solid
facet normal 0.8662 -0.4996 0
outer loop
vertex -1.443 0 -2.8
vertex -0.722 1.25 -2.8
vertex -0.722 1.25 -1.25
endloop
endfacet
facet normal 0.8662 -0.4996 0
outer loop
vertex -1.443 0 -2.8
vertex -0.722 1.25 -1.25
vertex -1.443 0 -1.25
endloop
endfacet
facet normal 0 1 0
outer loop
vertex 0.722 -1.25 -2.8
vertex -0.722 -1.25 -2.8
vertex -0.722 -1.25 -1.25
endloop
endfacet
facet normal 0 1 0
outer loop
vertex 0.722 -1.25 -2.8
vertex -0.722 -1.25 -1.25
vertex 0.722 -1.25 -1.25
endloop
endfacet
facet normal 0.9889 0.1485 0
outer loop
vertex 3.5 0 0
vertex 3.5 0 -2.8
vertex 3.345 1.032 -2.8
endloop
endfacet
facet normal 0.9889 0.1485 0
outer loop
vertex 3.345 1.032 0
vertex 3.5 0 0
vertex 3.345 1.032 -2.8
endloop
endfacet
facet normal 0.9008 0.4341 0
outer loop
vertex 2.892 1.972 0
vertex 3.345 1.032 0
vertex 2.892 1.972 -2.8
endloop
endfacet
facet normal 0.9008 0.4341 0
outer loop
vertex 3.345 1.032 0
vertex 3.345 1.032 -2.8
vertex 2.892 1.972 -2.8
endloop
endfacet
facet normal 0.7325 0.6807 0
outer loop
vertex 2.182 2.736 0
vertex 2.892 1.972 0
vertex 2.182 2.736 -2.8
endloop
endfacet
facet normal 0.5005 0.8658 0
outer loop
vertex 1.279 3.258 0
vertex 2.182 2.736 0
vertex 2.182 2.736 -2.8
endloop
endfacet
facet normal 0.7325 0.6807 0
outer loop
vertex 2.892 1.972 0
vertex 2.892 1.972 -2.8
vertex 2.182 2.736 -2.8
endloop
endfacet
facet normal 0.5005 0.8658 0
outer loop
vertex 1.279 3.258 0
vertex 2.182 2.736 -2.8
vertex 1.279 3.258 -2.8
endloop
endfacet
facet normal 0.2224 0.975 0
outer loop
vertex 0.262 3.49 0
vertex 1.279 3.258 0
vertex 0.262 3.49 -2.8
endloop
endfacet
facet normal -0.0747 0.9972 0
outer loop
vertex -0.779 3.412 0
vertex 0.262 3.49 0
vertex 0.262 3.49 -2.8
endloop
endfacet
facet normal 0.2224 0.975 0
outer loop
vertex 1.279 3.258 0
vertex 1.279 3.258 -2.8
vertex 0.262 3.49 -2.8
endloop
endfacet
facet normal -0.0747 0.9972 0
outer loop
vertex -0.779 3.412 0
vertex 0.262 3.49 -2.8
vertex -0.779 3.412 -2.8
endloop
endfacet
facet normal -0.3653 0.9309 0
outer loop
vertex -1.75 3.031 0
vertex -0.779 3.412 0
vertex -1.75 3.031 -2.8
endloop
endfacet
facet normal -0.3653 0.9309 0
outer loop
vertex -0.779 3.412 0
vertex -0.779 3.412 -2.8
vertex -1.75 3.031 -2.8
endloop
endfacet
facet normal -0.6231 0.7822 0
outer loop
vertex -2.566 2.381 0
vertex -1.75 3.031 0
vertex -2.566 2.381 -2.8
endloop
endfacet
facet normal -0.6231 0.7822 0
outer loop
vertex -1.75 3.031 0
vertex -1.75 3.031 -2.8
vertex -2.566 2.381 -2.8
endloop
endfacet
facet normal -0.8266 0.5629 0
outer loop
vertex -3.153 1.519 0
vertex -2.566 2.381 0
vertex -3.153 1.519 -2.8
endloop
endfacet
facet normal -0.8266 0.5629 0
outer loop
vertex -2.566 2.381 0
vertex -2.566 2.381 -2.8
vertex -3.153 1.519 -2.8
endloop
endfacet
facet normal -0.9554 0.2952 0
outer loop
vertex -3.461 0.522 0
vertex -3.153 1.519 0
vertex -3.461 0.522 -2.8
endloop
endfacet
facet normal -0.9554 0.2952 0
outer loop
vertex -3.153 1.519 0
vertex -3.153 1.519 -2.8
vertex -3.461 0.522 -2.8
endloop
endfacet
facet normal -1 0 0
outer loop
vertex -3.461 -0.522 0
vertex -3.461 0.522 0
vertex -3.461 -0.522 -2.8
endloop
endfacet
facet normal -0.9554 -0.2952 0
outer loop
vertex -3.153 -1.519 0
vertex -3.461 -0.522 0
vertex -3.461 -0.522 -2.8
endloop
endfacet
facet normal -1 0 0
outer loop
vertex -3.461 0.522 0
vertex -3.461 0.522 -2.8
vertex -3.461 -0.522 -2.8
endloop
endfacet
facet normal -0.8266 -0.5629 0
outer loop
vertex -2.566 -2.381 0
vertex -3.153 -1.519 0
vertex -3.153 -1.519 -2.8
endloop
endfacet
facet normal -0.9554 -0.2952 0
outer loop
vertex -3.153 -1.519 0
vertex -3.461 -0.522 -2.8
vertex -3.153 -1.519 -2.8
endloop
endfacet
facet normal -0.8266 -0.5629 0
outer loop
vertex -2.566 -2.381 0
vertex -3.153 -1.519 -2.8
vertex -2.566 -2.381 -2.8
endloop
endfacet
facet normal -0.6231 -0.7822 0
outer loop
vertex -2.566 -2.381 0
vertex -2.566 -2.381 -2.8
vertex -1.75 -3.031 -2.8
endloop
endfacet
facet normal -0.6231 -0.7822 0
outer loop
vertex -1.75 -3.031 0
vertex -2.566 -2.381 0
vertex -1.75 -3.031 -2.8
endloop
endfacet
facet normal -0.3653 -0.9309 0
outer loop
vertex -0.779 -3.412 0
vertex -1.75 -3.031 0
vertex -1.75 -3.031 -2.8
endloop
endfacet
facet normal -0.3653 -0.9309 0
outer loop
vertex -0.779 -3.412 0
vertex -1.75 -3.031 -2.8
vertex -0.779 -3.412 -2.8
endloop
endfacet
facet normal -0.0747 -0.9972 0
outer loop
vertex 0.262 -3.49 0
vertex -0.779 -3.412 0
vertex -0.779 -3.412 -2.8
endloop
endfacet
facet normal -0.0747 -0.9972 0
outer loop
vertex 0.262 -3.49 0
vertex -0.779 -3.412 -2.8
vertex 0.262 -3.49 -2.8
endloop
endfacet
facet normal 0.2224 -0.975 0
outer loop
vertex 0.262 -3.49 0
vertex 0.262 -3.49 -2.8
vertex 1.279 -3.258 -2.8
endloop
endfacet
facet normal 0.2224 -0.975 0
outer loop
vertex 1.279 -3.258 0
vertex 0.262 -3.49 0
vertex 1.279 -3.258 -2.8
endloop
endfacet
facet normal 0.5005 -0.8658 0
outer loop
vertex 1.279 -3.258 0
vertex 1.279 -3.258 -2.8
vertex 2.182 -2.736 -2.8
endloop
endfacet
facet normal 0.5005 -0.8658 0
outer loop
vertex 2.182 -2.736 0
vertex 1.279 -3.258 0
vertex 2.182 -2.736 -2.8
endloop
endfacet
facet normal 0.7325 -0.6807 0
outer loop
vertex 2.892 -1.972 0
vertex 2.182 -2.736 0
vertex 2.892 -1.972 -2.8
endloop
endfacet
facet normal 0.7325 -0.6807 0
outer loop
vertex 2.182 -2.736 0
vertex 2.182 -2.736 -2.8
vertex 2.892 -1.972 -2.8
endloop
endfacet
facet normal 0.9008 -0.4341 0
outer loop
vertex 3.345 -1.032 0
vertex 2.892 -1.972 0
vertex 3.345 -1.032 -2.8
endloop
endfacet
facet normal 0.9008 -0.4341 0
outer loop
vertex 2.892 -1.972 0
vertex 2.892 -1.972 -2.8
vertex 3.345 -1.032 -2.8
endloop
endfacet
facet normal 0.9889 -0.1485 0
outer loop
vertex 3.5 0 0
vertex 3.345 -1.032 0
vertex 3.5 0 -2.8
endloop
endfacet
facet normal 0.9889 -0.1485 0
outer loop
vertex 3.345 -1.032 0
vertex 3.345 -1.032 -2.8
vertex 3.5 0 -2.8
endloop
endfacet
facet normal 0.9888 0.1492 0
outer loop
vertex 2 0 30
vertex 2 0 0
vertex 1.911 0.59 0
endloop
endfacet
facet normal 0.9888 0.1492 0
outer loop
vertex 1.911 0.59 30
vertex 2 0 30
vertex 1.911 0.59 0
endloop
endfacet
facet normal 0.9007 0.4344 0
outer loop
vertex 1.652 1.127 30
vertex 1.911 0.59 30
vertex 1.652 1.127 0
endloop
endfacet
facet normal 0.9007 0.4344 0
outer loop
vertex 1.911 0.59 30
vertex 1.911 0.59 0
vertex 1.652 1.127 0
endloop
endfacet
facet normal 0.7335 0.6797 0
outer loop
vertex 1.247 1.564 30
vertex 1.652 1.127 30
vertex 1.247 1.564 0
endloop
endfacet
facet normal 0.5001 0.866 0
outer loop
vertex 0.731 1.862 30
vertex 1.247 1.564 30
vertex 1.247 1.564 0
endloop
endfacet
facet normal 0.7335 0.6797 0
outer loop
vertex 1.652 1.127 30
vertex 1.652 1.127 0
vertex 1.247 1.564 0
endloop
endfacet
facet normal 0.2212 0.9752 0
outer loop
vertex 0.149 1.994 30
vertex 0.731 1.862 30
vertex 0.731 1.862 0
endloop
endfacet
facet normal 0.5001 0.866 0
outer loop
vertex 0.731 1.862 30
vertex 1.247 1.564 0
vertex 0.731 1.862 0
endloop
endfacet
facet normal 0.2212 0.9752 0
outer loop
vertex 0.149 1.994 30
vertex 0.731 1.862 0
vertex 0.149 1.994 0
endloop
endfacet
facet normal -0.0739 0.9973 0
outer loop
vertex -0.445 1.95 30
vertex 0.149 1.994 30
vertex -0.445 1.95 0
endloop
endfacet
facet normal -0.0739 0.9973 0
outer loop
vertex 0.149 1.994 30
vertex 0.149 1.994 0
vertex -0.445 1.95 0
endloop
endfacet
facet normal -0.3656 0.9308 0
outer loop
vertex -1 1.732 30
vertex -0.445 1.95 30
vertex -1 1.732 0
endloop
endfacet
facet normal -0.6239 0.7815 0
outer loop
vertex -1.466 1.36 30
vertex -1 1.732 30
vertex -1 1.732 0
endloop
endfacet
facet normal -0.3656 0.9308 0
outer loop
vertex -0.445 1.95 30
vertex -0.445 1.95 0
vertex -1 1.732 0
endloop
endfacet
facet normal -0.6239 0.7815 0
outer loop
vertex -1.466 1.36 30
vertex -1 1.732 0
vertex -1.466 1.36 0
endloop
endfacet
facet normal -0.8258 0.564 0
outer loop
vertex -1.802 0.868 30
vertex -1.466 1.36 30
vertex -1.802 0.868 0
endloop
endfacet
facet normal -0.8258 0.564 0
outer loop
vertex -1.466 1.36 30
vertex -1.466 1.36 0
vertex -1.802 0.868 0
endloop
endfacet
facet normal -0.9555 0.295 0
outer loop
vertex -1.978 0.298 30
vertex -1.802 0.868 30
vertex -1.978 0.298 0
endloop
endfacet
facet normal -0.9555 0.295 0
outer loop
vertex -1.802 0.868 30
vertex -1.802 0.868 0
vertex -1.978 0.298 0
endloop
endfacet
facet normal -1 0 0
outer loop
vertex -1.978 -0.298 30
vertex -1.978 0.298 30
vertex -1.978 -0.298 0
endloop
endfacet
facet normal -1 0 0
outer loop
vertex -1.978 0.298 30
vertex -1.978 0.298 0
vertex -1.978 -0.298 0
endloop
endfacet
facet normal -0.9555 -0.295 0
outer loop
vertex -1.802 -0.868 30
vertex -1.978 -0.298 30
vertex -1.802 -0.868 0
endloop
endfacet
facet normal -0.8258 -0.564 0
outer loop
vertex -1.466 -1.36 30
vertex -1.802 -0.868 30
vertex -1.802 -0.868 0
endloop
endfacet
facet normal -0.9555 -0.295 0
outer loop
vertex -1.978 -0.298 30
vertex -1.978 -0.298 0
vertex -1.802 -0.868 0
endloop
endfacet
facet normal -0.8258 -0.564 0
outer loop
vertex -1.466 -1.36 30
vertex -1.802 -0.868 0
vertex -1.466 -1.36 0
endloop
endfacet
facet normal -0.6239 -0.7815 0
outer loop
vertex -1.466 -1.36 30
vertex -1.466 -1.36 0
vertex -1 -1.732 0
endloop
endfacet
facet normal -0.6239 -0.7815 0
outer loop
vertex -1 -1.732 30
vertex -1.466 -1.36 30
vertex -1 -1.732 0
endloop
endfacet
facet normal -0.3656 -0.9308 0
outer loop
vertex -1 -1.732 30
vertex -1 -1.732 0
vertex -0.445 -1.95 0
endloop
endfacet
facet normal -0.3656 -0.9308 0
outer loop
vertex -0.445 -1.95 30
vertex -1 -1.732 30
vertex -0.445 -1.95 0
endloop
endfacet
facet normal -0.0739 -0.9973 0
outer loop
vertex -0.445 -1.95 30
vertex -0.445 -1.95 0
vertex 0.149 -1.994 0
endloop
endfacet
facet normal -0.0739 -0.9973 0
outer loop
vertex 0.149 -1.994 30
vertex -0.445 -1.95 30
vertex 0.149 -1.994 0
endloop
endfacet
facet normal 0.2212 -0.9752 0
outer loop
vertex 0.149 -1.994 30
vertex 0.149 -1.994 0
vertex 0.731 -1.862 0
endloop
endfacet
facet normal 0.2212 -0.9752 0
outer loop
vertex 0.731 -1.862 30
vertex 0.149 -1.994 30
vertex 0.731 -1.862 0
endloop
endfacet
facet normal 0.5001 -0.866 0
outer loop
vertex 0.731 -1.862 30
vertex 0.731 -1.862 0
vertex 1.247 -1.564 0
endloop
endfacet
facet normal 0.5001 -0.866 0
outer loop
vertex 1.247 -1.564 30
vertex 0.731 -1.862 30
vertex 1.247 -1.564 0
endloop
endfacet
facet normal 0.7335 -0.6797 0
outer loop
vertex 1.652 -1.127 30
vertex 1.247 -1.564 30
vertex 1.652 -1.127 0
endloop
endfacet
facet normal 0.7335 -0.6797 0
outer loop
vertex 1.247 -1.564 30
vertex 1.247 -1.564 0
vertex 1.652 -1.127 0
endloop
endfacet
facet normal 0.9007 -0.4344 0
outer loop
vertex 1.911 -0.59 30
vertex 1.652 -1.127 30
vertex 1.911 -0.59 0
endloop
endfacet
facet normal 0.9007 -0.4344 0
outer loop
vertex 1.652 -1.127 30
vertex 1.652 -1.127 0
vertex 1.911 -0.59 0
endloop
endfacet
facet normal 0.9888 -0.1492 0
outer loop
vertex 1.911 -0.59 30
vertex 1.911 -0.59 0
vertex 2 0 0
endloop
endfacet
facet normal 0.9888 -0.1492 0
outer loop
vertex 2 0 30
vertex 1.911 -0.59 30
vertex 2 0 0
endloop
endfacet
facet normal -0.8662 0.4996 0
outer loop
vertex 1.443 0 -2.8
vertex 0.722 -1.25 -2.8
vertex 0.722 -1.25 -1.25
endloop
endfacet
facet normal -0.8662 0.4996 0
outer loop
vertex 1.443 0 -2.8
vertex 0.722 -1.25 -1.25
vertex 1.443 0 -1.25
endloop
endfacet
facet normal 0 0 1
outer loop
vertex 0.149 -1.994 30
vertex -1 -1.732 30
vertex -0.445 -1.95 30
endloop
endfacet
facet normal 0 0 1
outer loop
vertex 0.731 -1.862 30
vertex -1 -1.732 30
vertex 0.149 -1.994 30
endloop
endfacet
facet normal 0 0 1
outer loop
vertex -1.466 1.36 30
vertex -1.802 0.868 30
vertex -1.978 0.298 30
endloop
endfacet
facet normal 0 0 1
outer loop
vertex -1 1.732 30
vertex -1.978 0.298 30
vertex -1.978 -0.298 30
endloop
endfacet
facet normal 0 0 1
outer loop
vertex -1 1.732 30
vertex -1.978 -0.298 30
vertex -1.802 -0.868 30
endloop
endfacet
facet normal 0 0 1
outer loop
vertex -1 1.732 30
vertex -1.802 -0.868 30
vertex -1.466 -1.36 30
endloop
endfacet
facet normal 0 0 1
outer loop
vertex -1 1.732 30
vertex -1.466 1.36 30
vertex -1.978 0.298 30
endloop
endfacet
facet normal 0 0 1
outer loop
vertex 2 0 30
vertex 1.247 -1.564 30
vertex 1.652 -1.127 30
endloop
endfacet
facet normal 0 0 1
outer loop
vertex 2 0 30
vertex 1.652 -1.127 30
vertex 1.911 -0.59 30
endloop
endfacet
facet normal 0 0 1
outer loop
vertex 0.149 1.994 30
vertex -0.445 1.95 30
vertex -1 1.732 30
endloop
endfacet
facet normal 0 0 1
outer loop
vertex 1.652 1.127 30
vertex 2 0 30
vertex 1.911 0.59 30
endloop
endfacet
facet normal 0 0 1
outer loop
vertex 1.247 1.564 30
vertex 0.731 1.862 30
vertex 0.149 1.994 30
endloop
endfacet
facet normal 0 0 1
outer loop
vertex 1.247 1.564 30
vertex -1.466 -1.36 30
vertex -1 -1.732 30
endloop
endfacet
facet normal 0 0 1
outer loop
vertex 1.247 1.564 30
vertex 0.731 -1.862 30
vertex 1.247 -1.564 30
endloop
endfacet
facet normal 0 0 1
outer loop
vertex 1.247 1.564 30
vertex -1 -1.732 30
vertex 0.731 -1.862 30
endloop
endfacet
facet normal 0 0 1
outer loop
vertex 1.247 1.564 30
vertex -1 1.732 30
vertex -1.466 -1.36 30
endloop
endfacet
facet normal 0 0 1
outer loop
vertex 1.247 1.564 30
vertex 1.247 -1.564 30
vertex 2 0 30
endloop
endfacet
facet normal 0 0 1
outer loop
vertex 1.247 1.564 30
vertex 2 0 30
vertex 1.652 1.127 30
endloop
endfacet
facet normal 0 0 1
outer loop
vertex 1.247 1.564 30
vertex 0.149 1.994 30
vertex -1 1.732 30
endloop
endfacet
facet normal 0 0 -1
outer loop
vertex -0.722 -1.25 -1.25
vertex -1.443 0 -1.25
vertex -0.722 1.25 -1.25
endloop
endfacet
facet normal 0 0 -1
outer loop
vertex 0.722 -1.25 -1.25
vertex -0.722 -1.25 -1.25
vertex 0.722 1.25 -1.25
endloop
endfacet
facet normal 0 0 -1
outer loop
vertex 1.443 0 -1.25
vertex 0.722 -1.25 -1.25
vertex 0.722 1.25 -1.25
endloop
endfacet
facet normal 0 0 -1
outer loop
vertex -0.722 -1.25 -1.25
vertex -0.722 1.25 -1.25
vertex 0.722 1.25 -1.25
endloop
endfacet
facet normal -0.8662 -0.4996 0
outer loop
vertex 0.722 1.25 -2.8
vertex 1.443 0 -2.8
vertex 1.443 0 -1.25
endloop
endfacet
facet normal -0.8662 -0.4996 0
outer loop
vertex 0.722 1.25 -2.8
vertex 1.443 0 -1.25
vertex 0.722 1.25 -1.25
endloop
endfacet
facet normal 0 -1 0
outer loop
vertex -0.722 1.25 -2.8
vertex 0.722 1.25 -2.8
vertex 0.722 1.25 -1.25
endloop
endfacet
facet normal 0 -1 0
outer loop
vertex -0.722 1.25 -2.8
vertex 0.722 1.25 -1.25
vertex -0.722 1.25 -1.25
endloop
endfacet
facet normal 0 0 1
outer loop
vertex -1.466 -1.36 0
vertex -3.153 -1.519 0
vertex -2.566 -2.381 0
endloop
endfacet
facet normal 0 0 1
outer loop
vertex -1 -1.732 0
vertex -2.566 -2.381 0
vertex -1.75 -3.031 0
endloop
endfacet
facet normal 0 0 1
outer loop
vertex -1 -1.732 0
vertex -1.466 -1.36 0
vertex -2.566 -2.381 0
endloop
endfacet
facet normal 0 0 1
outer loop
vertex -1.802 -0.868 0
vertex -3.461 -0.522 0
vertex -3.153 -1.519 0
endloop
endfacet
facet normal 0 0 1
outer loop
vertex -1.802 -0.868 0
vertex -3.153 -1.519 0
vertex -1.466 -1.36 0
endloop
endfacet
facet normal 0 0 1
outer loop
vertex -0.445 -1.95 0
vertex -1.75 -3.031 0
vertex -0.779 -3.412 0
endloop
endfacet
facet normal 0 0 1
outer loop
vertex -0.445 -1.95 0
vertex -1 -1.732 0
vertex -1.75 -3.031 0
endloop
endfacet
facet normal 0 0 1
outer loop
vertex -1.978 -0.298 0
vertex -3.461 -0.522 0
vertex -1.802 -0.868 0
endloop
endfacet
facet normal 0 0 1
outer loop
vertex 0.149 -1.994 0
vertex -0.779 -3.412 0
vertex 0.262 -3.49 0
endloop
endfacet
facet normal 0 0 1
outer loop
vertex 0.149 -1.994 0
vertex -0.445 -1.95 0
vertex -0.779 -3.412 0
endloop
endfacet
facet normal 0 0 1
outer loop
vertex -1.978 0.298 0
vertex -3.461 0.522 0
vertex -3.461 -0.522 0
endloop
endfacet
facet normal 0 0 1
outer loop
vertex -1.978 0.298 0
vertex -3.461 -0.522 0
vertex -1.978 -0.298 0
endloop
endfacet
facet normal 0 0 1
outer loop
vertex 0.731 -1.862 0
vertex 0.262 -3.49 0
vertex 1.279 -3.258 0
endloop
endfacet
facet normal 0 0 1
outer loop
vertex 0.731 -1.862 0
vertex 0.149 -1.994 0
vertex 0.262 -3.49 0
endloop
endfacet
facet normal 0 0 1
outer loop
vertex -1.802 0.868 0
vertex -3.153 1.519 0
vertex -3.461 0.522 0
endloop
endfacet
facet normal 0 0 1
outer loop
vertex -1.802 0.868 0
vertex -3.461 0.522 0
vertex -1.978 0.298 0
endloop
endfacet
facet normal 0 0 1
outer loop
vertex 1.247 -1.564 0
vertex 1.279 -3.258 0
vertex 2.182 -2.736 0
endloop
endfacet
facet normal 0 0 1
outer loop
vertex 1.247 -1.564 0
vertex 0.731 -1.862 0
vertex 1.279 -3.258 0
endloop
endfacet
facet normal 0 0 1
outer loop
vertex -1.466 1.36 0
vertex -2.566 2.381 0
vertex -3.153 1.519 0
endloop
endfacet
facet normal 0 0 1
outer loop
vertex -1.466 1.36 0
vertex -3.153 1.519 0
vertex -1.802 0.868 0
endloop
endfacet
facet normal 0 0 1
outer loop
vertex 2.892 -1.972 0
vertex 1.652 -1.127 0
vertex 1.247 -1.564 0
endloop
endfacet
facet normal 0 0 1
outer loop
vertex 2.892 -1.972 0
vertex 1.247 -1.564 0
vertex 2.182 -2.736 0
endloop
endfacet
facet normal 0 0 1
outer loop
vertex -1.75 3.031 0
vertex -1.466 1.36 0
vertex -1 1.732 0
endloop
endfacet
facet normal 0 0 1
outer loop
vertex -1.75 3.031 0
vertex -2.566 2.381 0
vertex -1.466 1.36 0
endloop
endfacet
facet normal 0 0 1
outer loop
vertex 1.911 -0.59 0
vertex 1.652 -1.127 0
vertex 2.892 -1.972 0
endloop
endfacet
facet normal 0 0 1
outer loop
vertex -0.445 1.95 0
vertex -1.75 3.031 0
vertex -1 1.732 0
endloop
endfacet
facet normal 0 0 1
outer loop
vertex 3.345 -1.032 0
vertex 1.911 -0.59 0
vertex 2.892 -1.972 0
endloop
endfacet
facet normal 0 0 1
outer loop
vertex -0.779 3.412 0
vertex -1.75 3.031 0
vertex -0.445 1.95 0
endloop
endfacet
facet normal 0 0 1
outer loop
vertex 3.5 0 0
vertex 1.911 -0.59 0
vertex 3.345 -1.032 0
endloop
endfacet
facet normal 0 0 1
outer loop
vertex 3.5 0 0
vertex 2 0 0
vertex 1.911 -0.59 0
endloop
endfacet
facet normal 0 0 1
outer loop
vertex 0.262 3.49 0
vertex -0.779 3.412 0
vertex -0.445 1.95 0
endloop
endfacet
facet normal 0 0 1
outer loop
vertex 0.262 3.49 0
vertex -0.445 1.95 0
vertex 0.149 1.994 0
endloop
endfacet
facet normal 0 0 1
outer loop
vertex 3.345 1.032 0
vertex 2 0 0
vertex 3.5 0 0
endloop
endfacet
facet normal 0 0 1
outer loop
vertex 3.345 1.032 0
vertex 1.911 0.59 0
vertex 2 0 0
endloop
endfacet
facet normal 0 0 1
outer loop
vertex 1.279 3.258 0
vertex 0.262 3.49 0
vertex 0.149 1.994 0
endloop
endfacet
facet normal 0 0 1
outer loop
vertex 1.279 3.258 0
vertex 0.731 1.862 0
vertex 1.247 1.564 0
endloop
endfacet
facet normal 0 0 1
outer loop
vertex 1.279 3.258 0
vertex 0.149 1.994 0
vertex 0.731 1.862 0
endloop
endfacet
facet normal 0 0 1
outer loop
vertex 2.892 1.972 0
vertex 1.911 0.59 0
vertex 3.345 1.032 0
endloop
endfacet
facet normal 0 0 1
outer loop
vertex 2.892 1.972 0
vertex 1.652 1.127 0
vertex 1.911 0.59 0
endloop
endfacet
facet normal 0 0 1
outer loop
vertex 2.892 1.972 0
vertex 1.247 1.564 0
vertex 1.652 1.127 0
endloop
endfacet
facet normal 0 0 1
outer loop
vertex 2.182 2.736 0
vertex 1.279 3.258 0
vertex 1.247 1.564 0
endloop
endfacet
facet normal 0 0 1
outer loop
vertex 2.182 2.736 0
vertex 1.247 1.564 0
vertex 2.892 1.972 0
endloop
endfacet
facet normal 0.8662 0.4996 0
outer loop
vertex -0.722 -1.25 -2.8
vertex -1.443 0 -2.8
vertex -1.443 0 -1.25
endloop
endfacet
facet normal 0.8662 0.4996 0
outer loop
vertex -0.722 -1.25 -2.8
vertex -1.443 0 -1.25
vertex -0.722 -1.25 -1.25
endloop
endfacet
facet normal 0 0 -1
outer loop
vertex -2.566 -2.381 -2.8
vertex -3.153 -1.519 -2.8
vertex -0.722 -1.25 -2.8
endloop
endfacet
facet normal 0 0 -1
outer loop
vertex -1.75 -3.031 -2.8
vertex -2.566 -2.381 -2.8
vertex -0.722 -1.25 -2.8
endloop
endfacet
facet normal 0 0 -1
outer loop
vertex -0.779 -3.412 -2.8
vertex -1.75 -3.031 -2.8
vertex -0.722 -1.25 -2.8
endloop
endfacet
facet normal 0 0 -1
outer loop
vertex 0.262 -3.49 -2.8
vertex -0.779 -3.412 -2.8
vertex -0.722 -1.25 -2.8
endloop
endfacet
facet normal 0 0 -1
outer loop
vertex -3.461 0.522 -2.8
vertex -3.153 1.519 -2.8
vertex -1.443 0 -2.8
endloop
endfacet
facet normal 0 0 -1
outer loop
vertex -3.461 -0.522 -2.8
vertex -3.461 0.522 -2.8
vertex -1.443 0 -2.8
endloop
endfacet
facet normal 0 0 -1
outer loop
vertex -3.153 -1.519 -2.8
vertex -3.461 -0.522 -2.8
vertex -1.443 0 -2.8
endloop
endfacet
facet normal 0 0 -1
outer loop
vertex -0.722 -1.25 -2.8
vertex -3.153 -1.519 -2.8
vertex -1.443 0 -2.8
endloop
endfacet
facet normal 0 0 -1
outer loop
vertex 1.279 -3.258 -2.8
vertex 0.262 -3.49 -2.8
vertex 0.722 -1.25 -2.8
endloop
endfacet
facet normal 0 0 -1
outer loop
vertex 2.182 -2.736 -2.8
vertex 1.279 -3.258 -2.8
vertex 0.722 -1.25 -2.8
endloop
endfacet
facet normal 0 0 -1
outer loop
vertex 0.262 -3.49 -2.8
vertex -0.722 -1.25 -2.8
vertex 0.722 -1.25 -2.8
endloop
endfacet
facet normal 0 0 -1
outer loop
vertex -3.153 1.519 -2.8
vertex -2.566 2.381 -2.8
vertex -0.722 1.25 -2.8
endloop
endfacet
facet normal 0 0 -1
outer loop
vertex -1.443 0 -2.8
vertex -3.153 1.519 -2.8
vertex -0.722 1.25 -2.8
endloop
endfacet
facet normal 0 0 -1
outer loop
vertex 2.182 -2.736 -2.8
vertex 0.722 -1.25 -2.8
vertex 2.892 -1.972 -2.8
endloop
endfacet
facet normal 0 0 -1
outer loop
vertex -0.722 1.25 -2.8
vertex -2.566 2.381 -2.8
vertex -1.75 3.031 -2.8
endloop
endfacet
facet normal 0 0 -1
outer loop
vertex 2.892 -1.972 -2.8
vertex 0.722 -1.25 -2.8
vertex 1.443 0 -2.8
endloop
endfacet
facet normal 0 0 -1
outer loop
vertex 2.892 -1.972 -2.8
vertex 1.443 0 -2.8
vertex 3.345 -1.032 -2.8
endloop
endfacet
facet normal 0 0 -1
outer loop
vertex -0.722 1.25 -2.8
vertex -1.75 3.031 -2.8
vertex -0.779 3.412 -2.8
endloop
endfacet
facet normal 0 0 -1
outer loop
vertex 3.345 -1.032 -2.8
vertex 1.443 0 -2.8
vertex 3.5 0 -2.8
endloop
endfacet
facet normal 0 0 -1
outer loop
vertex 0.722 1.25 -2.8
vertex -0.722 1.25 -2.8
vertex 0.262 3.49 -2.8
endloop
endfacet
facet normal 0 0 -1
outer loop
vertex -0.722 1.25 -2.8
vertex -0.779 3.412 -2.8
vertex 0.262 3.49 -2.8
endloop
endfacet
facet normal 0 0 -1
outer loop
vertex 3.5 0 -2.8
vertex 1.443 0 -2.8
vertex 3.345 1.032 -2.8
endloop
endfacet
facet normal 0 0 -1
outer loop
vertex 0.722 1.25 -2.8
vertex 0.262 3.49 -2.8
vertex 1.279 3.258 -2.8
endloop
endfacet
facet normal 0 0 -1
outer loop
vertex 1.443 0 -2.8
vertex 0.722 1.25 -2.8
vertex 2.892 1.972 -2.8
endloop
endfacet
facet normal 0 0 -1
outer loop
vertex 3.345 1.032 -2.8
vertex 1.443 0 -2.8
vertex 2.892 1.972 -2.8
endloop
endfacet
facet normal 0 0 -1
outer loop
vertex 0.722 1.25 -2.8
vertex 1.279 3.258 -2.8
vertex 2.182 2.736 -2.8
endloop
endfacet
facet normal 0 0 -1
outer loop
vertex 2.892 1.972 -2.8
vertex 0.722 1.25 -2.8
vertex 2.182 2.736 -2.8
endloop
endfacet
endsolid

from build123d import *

# Parameters (mm, degrees)
F_01_START                  = -2.8
S01_LOW_SOCKET_HEAD_R       = 3.5
F_01_LOW_SOCKET_HEAD_DEPTH  = 2.8
S02_NOMINAL_M4_SHANK_R      = 2
F_02_NOMINAL_M4_SHANK_DEPTH = 30
F_03_START                  = -2.9
F_03_HEX_DRIVE_RECESS_DEPTH = 1.65


with BuildPart() as part:
    # S01 - Low socket head → 01 - Low socket head (new body)
    with BuildSketch(Plane.XY.offset(F_01_START)):
        Circle(S01_LOW_SOCKET_HEAD_R)
    extrude(amount=F_01_LOW_SOCKET_HEAD_DEPTH)

    # S02 - Nominal M4 shank → 02 - Nominal M4 shank (add)
    with BuildSketch(Plane.XY):
        Circle(S02_NOMINAL_M4_SHANK_R)
    extrude(amount=F_02_NOMINAL_M4_SHANK_DEPTH)

    # S03 - Hex drive recess → 03 - Hex drive recess (cut)
    with BuildSketch(Plane.XY.offset(F_03_START)):
        Polygon((1.443375673, 0), (0.721687836, 1.25), (-0.721687836, 1.25), (-1.443375673, 0), (-0.721687836, -1.25), (0.721687836, -1.25), align=None)
    extrude(amount=F_03_HEX_DRIVE_RECESS_DEPTH, mode=Mode.SUBTRACT)


solid = part.part
